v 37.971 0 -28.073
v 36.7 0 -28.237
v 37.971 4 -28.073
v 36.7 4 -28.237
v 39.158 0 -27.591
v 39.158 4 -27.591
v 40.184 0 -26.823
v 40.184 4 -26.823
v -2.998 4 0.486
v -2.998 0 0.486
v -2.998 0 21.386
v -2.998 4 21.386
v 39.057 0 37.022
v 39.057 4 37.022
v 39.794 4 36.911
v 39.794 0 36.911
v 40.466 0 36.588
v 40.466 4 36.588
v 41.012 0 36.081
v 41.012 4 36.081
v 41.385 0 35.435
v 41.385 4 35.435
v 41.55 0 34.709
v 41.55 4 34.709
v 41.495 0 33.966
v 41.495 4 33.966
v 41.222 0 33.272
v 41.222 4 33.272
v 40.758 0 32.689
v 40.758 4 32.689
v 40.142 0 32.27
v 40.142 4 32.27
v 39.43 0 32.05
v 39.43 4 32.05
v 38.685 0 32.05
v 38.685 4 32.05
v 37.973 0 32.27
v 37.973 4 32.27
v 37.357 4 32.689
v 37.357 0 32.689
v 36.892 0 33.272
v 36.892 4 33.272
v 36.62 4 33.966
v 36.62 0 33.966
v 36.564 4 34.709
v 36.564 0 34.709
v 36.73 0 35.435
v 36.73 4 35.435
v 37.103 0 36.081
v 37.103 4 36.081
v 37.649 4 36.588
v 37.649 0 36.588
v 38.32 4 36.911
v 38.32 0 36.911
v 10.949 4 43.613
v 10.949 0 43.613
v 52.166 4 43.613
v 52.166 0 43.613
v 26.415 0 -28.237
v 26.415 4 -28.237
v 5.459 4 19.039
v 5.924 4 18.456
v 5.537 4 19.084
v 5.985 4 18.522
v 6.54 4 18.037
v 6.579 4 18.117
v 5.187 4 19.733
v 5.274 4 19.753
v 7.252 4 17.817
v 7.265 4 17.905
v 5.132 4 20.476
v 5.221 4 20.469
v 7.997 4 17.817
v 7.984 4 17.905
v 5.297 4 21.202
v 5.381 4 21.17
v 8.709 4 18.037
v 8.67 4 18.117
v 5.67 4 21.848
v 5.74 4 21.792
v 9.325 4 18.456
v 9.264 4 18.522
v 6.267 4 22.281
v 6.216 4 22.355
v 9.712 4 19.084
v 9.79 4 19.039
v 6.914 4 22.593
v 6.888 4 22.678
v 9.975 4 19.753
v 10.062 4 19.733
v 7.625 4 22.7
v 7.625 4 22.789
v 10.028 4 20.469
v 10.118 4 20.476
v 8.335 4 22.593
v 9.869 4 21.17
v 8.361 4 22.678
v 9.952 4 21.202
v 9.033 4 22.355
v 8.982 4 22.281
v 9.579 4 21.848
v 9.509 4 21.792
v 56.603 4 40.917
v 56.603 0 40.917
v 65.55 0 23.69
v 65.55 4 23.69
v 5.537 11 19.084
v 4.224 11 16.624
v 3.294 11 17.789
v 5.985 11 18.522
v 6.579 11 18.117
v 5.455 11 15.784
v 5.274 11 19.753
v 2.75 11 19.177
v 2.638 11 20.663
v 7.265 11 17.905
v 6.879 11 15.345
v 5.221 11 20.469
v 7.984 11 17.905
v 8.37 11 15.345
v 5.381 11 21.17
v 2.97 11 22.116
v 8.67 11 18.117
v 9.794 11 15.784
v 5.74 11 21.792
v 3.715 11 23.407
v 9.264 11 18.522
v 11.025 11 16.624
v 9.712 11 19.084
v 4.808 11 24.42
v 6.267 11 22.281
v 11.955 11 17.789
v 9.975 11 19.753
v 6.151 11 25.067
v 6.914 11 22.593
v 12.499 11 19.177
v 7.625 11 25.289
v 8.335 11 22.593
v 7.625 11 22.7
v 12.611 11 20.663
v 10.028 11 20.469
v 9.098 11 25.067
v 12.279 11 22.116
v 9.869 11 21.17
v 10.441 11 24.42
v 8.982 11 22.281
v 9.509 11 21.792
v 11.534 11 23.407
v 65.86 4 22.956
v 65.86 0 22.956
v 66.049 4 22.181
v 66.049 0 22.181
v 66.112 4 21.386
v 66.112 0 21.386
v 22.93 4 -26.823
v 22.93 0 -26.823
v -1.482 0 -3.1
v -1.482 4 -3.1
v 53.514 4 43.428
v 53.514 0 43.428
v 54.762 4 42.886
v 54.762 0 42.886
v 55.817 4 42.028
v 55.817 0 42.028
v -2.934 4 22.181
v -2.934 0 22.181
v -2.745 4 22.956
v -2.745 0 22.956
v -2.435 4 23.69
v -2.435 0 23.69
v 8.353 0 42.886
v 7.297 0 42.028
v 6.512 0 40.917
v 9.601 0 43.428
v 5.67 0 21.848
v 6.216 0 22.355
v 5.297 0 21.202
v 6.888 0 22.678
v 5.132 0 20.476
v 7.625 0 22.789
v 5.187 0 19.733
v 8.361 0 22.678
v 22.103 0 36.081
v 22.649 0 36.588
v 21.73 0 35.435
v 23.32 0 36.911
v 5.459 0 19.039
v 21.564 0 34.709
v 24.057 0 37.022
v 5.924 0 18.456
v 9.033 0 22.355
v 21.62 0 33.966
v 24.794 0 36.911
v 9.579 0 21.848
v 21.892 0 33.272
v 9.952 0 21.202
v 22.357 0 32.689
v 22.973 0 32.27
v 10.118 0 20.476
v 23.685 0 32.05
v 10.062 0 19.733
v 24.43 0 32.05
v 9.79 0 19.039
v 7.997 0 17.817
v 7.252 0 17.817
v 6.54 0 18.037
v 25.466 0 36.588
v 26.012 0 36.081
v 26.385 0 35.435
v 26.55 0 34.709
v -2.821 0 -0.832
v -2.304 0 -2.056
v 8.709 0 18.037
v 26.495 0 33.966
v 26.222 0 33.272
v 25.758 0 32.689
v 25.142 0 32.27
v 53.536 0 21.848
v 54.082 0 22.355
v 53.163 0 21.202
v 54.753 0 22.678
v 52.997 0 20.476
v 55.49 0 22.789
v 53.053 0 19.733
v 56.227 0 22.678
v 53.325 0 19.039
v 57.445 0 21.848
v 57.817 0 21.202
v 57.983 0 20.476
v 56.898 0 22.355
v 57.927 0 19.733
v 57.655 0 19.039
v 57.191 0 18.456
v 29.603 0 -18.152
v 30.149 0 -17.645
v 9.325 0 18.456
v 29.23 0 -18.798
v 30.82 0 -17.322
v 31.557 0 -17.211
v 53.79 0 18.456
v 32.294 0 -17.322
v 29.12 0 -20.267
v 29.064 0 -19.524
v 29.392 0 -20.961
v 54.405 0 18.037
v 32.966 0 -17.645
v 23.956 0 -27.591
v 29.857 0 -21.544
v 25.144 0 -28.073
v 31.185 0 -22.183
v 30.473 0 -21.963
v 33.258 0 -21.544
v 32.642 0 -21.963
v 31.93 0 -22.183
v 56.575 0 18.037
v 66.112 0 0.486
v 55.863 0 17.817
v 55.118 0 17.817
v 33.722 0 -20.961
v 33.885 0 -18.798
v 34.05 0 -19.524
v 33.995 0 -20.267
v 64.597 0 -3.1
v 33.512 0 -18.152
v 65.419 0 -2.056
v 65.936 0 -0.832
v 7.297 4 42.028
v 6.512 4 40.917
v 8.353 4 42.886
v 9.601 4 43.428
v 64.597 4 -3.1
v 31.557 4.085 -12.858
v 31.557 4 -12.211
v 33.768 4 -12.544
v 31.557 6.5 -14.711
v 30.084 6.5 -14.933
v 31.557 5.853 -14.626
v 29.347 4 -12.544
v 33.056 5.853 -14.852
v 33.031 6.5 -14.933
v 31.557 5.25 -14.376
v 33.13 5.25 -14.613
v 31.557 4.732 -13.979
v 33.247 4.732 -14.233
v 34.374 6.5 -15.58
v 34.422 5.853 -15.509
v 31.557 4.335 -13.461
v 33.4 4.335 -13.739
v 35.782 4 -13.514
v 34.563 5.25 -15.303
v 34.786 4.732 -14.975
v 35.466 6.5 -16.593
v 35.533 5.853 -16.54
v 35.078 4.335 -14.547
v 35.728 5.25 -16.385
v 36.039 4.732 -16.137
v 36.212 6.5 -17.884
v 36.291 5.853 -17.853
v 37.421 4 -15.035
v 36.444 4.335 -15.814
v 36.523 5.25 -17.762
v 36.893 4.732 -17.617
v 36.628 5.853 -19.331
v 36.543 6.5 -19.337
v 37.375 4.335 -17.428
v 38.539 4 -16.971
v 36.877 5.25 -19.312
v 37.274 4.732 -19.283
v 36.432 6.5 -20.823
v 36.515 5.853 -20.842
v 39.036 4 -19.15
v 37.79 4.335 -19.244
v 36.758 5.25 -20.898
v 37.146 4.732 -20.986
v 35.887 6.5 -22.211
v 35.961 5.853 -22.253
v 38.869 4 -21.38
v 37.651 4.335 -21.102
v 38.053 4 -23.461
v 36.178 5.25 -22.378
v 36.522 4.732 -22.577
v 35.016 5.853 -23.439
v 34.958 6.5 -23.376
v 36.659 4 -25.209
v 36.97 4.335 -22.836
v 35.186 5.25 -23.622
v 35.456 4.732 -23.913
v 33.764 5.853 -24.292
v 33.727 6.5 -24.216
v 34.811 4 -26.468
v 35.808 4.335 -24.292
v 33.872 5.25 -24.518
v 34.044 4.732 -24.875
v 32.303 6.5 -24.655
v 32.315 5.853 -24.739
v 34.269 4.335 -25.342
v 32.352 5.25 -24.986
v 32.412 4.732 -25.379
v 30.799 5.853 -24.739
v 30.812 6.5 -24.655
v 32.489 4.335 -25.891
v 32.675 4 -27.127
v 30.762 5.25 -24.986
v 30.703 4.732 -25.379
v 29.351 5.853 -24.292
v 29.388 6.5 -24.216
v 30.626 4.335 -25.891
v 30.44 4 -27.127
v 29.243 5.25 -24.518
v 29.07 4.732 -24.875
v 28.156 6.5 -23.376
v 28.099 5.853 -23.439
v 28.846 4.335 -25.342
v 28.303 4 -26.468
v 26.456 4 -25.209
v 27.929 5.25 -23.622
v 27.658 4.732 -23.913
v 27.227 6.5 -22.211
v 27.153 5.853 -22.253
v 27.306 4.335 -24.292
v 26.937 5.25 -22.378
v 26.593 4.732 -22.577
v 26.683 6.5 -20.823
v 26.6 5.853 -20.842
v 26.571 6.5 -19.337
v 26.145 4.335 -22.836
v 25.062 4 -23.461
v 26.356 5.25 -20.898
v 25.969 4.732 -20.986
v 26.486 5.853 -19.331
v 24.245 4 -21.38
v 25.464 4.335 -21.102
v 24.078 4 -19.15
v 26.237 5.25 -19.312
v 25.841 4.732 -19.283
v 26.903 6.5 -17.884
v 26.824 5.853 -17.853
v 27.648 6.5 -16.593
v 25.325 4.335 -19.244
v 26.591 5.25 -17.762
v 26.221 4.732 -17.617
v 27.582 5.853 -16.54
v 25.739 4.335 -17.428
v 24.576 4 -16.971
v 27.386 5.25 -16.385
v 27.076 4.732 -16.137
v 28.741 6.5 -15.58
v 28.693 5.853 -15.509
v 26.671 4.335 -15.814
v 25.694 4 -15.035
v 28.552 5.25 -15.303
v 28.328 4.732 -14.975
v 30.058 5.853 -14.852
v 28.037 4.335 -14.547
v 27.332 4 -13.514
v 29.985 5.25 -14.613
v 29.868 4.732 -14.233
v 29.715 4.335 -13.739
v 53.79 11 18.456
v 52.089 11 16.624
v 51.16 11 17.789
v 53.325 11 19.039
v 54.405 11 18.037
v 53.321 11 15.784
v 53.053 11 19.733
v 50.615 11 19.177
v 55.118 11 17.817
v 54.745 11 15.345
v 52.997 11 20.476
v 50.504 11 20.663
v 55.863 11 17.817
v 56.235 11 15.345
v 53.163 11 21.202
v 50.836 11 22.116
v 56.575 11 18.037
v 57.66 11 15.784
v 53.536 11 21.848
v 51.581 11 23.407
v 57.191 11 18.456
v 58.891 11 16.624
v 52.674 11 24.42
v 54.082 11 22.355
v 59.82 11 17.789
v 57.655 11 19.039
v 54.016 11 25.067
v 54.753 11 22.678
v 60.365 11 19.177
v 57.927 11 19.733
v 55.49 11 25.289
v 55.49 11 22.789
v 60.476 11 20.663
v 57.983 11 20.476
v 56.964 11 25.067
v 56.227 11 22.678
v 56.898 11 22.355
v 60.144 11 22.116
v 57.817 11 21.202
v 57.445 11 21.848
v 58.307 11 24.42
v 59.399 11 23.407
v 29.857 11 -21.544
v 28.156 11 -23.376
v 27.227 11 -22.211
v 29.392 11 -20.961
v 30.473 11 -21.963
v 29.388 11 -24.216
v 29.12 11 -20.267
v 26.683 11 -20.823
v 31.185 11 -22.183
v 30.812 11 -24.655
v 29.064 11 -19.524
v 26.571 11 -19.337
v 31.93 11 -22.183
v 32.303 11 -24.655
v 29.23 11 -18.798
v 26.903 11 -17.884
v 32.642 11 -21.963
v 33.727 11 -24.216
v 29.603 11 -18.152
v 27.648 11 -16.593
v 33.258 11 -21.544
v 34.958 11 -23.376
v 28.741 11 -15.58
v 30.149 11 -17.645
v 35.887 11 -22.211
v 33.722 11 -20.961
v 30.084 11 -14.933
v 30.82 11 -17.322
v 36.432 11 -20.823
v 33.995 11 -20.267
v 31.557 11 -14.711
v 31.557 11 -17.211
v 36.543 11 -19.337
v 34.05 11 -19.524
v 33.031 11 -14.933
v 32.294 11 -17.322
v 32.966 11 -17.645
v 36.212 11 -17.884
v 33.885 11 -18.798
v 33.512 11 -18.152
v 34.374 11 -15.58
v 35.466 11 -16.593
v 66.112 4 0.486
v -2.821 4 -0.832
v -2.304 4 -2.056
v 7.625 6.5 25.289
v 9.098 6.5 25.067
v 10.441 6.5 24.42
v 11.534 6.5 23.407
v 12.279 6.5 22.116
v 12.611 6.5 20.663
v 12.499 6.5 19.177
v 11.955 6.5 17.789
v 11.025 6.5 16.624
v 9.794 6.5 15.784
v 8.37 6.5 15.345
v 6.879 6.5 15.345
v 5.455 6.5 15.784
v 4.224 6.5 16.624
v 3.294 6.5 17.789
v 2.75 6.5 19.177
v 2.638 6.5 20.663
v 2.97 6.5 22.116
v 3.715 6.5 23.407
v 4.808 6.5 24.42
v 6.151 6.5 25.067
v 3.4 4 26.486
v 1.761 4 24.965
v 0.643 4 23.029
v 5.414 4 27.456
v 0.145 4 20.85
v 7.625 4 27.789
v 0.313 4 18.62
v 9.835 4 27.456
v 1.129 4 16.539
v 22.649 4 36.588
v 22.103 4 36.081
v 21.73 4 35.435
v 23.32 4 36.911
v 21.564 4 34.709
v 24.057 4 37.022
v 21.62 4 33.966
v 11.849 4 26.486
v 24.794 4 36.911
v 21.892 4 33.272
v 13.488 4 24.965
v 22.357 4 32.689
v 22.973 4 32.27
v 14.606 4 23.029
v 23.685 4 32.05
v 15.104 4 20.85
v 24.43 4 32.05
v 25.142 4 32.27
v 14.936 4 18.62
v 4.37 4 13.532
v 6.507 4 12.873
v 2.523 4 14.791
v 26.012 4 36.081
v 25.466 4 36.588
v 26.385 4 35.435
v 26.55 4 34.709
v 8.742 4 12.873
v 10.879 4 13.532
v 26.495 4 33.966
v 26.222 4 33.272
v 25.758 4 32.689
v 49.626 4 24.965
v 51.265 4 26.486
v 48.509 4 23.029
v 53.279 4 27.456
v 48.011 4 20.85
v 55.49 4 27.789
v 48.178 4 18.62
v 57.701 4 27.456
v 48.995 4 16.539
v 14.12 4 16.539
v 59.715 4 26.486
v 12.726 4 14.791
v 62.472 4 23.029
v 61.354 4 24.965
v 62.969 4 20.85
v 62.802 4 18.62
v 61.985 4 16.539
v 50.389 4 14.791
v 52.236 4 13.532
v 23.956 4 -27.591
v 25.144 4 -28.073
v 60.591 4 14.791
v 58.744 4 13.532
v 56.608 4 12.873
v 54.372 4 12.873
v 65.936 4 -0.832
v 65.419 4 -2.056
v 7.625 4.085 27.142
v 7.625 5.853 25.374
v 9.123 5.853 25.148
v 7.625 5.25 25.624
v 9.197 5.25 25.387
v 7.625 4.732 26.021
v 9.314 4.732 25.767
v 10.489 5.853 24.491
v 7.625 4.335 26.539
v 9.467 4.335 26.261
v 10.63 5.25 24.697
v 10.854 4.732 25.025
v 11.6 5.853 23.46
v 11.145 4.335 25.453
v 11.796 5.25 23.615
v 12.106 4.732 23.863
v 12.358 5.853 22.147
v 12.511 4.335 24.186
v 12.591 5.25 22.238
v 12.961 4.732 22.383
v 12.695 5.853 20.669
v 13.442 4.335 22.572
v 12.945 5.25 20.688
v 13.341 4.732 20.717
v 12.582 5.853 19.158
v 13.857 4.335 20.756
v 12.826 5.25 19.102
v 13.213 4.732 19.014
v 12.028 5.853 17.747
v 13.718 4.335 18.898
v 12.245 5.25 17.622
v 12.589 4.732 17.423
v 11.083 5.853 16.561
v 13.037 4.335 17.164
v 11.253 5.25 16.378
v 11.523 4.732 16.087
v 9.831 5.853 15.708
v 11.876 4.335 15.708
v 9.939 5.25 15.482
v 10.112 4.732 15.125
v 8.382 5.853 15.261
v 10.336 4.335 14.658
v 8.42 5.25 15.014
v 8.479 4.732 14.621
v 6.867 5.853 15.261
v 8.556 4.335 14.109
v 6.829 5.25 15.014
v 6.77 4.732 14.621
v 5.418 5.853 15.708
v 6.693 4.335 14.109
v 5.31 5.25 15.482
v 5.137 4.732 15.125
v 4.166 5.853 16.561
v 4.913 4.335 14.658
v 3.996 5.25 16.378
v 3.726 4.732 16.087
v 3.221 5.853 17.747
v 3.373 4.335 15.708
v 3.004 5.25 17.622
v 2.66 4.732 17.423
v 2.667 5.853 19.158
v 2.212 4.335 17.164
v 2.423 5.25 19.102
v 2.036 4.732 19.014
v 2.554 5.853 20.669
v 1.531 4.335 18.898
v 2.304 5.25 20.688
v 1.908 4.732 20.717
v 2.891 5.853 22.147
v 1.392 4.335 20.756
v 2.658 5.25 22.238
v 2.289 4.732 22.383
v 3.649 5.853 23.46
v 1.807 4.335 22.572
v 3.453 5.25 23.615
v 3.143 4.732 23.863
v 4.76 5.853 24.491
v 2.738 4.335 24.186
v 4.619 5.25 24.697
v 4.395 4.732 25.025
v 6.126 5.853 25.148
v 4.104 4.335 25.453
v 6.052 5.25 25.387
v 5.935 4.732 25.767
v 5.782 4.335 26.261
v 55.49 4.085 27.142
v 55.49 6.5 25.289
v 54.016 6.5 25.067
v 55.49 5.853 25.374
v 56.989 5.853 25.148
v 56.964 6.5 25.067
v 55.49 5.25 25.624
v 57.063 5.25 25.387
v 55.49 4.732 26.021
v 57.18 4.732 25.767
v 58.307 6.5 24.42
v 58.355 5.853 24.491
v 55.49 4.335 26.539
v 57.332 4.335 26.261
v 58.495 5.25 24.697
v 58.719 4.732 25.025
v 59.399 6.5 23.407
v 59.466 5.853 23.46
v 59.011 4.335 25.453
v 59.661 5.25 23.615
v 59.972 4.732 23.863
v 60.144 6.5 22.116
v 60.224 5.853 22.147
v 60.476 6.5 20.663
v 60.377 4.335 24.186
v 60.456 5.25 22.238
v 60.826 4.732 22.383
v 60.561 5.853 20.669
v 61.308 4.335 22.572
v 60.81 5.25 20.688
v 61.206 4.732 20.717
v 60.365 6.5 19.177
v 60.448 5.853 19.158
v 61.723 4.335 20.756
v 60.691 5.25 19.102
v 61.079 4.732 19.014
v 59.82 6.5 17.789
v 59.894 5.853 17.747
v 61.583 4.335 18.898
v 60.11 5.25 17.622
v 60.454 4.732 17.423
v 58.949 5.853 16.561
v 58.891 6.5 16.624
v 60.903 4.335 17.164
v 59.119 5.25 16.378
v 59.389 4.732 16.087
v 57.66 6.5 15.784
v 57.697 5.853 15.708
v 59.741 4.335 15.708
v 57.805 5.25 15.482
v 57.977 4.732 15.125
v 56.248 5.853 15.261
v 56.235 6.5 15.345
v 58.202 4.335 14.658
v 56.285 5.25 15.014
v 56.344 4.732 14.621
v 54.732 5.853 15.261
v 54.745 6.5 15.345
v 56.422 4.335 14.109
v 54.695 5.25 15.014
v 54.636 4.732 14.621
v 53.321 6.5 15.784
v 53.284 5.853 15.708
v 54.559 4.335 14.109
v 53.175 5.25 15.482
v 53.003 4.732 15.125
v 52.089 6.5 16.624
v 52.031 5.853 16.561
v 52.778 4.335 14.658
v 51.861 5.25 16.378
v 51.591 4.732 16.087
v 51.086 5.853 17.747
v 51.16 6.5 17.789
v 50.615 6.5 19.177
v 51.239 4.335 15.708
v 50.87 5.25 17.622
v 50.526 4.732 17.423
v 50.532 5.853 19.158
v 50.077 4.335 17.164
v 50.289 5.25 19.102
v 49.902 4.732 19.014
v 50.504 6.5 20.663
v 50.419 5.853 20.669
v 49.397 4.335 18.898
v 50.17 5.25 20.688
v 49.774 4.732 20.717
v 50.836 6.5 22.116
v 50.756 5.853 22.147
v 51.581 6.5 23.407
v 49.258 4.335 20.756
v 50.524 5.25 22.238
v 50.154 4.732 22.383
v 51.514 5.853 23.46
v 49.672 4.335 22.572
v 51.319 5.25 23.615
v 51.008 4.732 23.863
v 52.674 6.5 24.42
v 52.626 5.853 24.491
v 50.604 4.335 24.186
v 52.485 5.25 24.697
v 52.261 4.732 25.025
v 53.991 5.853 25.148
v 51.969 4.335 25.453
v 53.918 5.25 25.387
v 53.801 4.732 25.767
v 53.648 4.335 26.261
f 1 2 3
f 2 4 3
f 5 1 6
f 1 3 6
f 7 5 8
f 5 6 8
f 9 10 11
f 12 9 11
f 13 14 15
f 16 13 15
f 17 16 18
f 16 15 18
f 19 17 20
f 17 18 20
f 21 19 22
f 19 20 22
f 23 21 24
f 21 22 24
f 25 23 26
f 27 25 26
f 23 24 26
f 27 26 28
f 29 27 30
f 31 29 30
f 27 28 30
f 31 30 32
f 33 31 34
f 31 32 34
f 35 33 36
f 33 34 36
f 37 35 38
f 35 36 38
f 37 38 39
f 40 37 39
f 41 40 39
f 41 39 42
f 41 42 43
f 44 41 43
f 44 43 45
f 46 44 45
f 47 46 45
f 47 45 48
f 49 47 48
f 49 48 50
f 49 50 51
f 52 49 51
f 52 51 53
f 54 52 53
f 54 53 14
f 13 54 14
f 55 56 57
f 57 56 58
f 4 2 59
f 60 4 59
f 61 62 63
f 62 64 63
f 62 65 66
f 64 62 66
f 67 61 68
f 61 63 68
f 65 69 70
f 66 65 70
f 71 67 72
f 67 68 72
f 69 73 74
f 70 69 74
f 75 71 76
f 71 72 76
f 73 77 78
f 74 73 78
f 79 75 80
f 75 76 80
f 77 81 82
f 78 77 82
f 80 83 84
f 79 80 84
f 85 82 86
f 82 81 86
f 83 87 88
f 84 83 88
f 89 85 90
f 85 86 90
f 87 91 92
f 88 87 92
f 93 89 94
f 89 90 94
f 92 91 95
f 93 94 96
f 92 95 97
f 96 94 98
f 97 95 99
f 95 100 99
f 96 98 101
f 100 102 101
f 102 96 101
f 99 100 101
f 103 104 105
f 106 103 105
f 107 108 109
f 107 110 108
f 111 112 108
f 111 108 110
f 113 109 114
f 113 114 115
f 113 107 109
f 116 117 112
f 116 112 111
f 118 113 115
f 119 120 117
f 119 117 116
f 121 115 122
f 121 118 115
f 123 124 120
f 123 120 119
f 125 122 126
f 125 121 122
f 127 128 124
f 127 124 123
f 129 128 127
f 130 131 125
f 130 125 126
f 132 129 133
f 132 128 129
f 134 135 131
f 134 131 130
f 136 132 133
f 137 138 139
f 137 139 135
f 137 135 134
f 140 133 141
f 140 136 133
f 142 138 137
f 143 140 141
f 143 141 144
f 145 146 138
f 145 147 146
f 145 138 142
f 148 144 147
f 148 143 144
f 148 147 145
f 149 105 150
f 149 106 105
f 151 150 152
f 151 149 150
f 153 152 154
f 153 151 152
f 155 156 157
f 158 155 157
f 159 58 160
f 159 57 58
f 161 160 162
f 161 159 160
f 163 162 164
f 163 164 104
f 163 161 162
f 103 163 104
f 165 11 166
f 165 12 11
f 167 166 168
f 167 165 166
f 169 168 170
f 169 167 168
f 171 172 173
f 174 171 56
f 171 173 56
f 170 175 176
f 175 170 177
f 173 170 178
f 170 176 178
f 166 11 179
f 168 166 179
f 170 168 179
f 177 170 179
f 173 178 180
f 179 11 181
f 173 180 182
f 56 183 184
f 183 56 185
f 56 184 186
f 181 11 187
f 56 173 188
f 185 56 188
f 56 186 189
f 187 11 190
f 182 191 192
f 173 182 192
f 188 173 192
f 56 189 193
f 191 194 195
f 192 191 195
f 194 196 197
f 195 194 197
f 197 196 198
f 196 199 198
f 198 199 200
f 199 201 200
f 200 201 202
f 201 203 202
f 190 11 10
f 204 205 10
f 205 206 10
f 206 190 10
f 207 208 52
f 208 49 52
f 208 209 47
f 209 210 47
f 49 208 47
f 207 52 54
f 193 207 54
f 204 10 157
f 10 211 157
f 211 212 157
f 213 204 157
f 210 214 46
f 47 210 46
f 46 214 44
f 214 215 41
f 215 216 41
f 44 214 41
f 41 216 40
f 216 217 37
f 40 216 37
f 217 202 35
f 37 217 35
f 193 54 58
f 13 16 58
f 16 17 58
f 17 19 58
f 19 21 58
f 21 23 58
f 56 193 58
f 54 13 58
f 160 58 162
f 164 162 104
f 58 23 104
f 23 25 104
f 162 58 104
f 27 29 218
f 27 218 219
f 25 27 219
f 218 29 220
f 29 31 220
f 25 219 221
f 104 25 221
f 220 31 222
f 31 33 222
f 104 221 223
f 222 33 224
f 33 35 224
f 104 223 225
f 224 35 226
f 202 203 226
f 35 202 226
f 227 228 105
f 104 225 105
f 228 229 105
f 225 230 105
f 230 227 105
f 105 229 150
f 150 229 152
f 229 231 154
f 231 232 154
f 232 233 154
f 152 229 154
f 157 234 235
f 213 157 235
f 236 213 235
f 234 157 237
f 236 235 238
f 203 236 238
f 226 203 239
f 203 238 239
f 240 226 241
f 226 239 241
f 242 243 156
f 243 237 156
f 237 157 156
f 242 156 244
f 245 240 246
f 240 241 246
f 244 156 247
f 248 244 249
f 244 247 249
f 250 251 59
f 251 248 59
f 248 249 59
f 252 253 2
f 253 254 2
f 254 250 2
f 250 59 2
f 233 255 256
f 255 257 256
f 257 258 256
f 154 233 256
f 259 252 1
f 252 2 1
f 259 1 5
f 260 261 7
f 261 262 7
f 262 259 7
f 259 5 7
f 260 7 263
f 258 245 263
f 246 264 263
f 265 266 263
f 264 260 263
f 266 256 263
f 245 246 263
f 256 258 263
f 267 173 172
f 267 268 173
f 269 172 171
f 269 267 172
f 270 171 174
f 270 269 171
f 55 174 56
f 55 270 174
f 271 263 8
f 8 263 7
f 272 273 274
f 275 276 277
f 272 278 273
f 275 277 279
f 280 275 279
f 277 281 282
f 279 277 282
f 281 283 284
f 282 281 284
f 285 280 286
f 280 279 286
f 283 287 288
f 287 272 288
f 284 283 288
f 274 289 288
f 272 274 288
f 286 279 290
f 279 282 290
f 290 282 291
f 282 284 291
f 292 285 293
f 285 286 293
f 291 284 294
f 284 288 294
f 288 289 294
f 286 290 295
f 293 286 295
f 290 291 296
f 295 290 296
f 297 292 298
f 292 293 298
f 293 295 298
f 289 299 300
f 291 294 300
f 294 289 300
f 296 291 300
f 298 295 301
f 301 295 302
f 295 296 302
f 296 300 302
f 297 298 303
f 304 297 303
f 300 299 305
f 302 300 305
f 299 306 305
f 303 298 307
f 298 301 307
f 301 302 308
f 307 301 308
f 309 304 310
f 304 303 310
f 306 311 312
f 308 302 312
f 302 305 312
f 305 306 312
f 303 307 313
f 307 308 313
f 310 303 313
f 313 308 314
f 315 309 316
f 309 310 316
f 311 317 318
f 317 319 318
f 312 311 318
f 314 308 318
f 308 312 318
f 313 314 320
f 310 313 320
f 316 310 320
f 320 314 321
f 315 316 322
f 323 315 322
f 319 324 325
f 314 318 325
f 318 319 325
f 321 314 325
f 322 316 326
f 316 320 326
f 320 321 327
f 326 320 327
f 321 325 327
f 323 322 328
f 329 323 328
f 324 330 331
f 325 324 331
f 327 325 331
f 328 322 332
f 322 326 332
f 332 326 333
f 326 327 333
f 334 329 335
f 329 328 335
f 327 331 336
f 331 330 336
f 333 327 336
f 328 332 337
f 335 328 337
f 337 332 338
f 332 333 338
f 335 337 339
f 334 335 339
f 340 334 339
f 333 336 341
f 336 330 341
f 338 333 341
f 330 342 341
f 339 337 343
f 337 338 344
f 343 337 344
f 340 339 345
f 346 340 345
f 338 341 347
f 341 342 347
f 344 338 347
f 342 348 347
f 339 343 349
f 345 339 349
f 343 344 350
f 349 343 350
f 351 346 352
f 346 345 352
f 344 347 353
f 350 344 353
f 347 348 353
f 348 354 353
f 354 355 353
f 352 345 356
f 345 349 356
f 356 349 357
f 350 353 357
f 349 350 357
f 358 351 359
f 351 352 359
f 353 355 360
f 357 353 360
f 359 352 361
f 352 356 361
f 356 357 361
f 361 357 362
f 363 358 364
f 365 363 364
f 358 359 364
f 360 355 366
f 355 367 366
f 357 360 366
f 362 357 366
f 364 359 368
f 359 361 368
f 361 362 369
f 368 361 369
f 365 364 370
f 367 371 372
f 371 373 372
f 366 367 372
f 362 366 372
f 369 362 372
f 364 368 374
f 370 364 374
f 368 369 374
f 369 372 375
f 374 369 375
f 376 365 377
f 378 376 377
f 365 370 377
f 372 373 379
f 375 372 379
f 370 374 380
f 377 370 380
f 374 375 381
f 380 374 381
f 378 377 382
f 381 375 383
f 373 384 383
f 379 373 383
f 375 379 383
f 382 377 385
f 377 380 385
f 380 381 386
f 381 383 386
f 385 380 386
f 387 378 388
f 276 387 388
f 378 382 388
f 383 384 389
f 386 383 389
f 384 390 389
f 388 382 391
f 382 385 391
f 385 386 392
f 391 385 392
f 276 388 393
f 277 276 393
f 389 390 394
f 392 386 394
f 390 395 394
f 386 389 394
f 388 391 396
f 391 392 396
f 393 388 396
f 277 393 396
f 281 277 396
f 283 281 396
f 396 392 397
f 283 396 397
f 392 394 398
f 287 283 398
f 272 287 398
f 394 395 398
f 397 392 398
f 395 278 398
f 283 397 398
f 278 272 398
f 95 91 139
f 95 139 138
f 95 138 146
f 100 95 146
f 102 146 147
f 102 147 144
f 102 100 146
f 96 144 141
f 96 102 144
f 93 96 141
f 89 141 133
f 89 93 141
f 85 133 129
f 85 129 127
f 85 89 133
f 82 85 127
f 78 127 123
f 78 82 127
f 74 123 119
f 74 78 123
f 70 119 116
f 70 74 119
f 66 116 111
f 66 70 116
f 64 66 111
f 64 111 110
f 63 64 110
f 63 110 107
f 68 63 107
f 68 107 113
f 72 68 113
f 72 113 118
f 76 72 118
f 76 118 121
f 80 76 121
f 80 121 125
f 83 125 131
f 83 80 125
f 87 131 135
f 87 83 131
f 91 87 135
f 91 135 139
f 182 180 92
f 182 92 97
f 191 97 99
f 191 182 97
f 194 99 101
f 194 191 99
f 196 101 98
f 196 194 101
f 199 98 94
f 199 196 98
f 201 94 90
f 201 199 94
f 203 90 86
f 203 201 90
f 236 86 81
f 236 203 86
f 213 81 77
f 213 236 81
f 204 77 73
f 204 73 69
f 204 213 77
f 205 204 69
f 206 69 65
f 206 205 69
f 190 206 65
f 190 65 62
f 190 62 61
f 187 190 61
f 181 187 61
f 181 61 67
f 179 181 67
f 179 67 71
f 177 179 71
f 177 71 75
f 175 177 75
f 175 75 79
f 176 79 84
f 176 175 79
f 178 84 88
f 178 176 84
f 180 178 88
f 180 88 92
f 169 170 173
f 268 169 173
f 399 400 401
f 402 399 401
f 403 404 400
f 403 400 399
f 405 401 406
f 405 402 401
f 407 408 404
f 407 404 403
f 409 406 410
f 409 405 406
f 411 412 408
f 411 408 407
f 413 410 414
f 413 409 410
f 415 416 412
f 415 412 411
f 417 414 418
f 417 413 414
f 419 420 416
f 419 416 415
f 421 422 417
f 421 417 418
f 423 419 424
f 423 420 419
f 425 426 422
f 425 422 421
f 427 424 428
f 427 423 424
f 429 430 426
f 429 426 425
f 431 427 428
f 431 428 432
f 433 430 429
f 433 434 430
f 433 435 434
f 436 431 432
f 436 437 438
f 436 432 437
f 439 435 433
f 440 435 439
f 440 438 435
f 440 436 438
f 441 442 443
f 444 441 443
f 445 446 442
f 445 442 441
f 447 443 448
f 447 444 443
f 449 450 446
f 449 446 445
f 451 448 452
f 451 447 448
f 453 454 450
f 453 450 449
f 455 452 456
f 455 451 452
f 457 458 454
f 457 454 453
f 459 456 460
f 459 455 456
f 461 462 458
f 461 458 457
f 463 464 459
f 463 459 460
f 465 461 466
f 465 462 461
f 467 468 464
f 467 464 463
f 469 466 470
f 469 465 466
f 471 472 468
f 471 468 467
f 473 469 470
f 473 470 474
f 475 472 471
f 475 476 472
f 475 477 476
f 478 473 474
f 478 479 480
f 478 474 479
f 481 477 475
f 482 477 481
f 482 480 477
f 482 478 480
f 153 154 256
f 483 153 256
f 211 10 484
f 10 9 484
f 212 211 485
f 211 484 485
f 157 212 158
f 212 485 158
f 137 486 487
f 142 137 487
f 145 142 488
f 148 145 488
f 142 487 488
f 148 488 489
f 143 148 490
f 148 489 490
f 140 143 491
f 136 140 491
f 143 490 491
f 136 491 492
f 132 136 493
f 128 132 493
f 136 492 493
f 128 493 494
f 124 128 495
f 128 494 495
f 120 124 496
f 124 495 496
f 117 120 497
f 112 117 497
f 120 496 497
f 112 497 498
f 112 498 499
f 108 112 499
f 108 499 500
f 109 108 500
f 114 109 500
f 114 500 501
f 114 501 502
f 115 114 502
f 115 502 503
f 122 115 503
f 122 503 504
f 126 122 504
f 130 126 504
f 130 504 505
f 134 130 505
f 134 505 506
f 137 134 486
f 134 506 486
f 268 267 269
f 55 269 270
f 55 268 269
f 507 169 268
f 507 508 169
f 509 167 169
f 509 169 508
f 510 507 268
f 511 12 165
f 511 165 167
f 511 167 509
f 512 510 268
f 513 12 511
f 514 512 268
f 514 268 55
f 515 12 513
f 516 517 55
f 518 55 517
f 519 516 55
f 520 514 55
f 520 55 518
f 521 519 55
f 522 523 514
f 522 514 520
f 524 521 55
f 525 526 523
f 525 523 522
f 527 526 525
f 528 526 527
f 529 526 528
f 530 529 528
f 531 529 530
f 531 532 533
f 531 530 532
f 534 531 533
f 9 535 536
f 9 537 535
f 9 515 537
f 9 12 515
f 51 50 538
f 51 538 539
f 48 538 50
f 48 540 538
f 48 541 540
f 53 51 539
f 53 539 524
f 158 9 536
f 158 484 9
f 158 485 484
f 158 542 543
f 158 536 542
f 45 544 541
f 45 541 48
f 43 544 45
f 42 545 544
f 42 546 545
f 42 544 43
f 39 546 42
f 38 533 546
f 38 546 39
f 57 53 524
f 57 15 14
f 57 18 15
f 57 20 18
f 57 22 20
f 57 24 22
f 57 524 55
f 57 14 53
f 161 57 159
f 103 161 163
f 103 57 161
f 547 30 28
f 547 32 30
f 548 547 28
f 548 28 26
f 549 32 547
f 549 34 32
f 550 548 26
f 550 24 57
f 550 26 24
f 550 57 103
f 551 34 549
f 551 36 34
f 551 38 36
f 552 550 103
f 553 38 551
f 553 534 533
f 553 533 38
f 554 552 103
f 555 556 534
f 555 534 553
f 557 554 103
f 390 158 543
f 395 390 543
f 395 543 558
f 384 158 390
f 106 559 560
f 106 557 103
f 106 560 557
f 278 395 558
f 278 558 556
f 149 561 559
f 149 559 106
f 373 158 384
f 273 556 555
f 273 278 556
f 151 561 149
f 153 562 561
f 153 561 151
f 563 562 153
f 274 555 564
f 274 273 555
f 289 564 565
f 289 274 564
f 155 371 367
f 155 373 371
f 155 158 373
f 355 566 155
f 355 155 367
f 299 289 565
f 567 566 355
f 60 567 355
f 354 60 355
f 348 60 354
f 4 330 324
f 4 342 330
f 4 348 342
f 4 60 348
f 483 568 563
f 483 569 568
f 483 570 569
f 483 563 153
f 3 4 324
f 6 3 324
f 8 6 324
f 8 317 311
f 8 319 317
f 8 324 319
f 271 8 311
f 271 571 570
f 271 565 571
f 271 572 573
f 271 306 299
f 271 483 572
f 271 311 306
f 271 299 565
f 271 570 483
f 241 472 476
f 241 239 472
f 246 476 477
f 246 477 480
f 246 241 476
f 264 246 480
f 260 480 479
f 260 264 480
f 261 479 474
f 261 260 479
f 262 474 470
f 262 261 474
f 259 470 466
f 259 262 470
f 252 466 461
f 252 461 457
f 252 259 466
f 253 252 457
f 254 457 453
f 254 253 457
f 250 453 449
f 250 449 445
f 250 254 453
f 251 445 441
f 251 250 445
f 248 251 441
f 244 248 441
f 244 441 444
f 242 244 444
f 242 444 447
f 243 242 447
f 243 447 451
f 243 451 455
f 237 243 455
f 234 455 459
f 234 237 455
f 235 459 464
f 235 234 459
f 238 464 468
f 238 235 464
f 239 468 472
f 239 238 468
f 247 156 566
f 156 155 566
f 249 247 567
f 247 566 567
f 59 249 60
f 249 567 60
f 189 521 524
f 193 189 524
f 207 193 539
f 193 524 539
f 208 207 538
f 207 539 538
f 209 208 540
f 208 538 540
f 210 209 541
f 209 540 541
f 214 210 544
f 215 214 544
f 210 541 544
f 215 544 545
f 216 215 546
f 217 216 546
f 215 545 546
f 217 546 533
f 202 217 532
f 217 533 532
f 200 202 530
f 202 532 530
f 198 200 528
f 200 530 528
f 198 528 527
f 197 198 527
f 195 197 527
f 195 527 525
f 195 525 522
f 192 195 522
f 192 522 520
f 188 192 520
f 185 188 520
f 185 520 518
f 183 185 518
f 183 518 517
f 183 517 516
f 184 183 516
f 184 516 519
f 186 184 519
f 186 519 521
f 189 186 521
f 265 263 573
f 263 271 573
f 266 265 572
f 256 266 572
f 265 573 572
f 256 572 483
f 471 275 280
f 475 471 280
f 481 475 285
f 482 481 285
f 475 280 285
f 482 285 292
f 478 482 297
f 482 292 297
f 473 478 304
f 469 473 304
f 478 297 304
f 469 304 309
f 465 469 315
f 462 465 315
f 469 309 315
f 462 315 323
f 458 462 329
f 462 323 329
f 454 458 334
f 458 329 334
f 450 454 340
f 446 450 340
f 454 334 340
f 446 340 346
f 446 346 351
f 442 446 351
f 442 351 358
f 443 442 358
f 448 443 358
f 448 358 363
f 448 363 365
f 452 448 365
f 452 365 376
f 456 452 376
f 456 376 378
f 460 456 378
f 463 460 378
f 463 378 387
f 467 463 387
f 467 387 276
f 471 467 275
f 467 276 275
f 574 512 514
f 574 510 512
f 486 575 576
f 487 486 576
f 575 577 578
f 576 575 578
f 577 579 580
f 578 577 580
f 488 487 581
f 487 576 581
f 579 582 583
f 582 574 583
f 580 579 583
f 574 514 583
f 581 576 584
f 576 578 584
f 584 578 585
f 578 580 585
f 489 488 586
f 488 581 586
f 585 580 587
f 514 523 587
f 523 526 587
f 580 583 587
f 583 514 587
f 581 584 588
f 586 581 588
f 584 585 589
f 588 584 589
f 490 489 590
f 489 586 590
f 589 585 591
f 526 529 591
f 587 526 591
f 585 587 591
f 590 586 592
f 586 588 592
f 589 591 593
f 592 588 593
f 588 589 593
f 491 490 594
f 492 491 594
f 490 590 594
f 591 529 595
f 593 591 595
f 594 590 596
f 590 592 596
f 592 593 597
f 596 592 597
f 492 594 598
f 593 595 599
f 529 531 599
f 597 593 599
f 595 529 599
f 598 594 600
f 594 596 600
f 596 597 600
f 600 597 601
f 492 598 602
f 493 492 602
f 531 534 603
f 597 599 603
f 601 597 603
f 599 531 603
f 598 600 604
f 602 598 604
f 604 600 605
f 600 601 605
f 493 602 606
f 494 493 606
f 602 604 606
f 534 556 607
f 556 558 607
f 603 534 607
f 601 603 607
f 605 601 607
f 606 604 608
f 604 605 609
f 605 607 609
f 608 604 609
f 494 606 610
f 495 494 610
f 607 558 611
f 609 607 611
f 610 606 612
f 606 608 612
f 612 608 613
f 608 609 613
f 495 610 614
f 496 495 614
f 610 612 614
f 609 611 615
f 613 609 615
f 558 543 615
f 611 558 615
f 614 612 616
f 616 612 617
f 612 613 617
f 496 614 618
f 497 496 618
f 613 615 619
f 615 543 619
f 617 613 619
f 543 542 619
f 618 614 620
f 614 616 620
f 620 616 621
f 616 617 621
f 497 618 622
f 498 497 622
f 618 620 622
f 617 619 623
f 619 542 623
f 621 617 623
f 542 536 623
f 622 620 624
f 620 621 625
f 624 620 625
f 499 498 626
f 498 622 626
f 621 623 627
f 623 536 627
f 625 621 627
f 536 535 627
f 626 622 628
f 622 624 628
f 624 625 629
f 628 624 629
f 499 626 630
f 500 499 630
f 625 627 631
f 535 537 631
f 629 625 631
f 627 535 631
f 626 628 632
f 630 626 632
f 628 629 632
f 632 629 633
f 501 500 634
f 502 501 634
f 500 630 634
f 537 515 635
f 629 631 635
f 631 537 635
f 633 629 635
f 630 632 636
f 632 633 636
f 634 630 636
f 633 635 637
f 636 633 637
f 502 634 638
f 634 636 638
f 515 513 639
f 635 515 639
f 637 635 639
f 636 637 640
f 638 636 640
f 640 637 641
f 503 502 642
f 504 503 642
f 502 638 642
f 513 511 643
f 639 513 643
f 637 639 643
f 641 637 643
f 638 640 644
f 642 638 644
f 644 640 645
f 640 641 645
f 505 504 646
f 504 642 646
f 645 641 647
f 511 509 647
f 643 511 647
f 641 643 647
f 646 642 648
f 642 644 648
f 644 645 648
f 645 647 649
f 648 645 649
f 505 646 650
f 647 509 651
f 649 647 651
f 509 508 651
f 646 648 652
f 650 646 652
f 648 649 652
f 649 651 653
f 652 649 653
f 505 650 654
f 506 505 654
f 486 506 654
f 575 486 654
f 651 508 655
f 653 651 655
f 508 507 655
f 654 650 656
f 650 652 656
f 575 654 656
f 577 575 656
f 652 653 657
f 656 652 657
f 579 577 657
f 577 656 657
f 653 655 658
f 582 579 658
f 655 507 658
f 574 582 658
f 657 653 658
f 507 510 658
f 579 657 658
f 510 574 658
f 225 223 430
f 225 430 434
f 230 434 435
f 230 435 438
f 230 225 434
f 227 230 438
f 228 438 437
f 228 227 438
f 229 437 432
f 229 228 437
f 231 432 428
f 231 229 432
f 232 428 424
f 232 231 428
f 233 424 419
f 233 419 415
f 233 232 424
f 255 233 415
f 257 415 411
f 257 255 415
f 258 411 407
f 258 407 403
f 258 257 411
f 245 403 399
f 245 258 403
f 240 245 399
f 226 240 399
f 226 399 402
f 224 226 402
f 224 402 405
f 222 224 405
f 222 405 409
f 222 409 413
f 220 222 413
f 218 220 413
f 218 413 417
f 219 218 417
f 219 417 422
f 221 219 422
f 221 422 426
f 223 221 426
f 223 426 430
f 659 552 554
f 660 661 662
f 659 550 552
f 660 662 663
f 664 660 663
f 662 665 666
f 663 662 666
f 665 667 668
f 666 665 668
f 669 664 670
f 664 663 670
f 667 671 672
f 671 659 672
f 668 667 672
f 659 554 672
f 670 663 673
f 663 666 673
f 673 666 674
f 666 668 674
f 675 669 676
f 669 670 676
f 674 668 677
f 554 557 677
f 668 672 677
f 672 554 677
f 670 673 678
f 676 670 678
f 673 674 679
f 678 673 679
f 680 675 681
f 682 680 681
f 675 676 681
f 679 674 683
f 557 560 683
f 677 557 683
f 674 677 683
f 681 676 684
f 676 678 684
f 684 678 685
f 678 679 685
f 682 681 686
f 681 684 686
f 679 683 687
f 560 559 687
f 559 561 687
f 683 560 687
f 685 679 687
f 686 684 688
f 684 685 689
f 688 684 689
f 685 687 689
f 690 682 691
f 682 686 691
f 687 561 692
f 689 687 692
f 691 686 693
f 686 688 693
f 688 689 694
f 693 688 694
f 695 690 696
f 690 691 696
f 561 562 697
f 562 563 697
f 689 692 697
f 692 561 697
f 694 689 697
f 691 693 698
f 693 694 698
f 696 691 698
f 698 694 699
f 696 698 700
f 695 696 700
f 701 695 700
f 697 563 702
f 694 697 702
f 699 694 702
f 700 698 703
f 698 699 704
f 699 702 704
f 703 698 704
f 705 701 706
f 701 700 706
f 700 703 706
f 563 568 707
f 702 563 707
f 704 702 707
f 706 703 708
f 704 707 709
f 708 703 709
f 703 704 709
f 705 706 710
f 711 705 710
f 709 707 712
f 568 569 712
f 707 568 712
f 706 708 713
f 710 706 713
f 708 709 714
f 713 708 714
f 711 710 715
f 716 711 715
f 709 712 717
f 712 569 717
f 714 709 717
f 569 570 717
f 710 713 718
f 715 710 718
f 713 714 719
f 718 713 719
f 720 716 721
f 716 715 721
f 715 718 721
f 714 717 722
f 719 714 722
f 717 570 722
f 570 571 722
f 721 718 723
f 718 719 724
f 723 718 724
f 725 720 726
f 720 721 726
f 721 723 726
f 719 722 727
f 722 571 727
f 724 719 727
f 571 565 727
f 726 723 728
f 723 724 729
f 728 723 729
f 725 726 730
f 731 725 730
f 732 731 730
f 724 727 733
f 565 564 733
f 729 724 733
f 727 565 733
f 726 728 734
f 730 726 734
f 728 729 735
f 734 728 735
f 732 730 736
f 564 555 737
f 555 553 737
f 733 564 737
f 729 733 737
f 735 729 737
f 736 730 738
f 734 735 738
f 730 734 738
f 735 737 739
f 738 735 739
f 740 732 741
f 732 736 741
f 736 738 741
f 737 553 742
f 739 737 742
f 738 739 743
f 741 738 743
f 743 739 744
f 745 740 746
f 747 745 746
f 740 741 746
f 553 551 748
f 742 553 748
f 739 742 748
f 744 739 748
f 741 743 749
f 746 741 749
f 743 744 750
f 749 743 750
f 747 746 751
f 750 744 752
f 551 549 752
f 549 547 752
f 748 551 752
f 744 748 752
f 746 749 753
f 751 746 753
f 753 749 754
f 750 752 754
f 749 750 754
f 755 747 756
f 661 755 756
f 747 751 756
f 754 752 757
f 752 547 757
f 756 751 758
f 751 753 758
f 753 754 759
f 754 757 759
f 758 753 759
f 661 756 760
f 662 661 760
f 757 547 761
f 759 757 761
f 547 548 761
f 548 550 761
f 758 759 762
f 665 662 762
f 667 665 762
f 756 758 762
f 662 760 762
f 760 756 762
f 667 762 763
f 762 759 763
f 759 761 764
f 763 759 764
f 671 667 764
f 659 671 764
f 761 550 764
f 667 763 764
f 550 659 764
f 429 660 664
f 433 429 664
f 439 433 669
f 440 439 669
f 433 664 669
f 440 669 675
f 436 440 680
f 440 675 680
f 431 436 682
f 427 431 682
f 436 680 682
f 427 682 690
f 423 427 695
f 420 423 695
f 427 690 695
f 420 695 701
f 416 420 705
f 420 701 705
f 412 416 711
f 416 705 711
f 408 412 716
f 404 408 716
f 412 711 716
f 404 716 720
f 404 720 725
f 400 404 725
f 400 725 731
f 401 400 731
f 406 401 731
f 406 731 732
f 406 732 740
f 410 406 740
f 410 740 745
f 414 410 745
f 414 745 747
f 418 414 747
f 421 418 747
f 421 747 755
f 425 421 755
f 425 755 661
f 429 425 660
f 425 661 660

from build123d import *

# Parameters (mm, degrees)
SKETCH1_R           = 2.5
BOSS_EXTRUDE2_DEPTH = 4
FILLET1_R           = 5
SKETCH2_R           = 5
SKETCH2_R_2         = 2.5
SKETCH2_R_3         = 2.410622894
BOSS_EXTRUDE3_DEPTH = 7
FILLET2_R           = 2.5
SKETCH3_R           = 2.5
CUT_EXTRUDE1_DEPTH  = 80.510690177


with BuildPart() as part:
    # Sketch1 → Boss-Extrude2 (new body)
    with BuildSketch(Plane(origin=(0, 0, 0), x_dir=(1, 0, 0), z_dir=(0, 1, 0))):
        Polygon((-2.997842525, 1.627546264), (-2.997842525, -22.606832334), (7.911575214, -43.612950039), (31.557320362, -43.612950039), (55.203065509, -43.612950039), (66.112483248, -22.606832334), (66.112483248, 1.627546264), (38.728999177, 28.237162663), (24.385641546, 28.237162663), align=None)
        with Locations(Location((55.490124242, -20.289109104, 0), (0, 0, 270))):
            Circle(SKETCH1_R, mode=Mode.SUBTRACT)
        with Locations(Location((31.557320362, 19.710890896, 0), (0, 0, 270))):
            Circle(SKETCH1_R, mode=Mode.SUBTRACT)
        with Locations(Location((7.624516482, -20.289109104, 0), (0, 0, 270))):
            Circle(SKETCH1_R, mode=Mode.SUBTRACT)
    extrude(amount=BOSS_EXTRUDE2_DEPTH)

    # Fillet1
    fillet1_edges = [part.edges().sort_by_distance(p)[0] for p in [
        (24.385641546, 2, -28.237162663),
        (38.728999177, 2, -28.237162663),
        (66.112483248, 2, -1.627546264),
        (66.112483248, 2, 22.606832334),
        (55.203065509, 2, 43.612950039),
        (7.911575214, 2, 43.612950039),
        (-2.997842525, 2, 22.606832334),
        (-2.997842525, 2, -1.627546264),
    ]]
    fillet(fillet1_edges, radius=FILLET1_R)

    # Sketch2 → Boss-Extrude3 (add)
    # profile 1 of 3: a face of its own
    with BuildSketch(Plane(origin=(0, 4, 0), x_dir=(1, 0, 0), z_dir=(0, 1, 0))):
        with Locations(Location((31.557320362, 19.710890896, 0), (0, 0, 270))):
            Circle(SKETCH2_R)
        with Locations(Location((31.557320362, 19.710890896, 0), (0, 0, 270))):
            Circle(SKETCH2_R_2, mode=Mode.SUBTRACT)
    # profile 2 of 3: a face of its own
    with BuildSketch(Plane(origin=(0, 4, 0), x_dir=(1, 0, 0), z_dir=(0, 1, 0))):
        with Locations(Location((55.490124242, -20.289109104, 0), (0, 0, 270))):
            Circle(SKETCH2_R)
        with Locations(Location((55.490124242, -20.289109104, 0), (0, 0, 270))):
            Circle(SKETCH2_R_2, mode=Mode.SUBTRACT)
    # profile 3 of 3: a face of its own
    with BuildSketch(Plane(origin=(0, 4, 0), x_dir=(1, 0, 0), z_dir=(0, 1, 0))):
        with Locations(Location((7.624516482, -20.289109104, 0), (0, 0, 270))):
            Circle(SKETCH2_R)
        with Locations(Location((7.624516482, -20.289109104, 0), (0, 0, 270))):
            Circle(SKETCH2_R_3, mode=Mode.SUBTRACT)
    extrude(amount=BOSS_EXTRUDE3_DEPTH)

    # Fillet2
    fillet2_edges = [part.edges().sort_by_distance(p)[0] for p in [
        (55.490124242, 4, 15.289109104),
        (7.624516482, 4, 15.289109104),
        (31.557320362, 4, -24.710890896),
    ]]
    fillet(fillet2_edges, radius=FILLET2_R)

    # Sketch3 → Cut-Extrude1 (cut, through all)
    with BuildSketch(Plane(origin=(0, 4, 0), x_dir=(1, 0, 0), z_dir=(0, 1, 0))):
        with Locations(Location((39.057320362, -34.521990264, 0), (0, 0, 270))):
            Circle(SKETCH3_R)
        with Locations(Location((24.057320362, -34.521990264, 0), (0, 0, 270))):
            Circle(SKETCH3_R)
    extrude(amount=-CUT_EXTRUDE1_DEPTH, mode=Mode.SUBTRACT)


solid = part.part
